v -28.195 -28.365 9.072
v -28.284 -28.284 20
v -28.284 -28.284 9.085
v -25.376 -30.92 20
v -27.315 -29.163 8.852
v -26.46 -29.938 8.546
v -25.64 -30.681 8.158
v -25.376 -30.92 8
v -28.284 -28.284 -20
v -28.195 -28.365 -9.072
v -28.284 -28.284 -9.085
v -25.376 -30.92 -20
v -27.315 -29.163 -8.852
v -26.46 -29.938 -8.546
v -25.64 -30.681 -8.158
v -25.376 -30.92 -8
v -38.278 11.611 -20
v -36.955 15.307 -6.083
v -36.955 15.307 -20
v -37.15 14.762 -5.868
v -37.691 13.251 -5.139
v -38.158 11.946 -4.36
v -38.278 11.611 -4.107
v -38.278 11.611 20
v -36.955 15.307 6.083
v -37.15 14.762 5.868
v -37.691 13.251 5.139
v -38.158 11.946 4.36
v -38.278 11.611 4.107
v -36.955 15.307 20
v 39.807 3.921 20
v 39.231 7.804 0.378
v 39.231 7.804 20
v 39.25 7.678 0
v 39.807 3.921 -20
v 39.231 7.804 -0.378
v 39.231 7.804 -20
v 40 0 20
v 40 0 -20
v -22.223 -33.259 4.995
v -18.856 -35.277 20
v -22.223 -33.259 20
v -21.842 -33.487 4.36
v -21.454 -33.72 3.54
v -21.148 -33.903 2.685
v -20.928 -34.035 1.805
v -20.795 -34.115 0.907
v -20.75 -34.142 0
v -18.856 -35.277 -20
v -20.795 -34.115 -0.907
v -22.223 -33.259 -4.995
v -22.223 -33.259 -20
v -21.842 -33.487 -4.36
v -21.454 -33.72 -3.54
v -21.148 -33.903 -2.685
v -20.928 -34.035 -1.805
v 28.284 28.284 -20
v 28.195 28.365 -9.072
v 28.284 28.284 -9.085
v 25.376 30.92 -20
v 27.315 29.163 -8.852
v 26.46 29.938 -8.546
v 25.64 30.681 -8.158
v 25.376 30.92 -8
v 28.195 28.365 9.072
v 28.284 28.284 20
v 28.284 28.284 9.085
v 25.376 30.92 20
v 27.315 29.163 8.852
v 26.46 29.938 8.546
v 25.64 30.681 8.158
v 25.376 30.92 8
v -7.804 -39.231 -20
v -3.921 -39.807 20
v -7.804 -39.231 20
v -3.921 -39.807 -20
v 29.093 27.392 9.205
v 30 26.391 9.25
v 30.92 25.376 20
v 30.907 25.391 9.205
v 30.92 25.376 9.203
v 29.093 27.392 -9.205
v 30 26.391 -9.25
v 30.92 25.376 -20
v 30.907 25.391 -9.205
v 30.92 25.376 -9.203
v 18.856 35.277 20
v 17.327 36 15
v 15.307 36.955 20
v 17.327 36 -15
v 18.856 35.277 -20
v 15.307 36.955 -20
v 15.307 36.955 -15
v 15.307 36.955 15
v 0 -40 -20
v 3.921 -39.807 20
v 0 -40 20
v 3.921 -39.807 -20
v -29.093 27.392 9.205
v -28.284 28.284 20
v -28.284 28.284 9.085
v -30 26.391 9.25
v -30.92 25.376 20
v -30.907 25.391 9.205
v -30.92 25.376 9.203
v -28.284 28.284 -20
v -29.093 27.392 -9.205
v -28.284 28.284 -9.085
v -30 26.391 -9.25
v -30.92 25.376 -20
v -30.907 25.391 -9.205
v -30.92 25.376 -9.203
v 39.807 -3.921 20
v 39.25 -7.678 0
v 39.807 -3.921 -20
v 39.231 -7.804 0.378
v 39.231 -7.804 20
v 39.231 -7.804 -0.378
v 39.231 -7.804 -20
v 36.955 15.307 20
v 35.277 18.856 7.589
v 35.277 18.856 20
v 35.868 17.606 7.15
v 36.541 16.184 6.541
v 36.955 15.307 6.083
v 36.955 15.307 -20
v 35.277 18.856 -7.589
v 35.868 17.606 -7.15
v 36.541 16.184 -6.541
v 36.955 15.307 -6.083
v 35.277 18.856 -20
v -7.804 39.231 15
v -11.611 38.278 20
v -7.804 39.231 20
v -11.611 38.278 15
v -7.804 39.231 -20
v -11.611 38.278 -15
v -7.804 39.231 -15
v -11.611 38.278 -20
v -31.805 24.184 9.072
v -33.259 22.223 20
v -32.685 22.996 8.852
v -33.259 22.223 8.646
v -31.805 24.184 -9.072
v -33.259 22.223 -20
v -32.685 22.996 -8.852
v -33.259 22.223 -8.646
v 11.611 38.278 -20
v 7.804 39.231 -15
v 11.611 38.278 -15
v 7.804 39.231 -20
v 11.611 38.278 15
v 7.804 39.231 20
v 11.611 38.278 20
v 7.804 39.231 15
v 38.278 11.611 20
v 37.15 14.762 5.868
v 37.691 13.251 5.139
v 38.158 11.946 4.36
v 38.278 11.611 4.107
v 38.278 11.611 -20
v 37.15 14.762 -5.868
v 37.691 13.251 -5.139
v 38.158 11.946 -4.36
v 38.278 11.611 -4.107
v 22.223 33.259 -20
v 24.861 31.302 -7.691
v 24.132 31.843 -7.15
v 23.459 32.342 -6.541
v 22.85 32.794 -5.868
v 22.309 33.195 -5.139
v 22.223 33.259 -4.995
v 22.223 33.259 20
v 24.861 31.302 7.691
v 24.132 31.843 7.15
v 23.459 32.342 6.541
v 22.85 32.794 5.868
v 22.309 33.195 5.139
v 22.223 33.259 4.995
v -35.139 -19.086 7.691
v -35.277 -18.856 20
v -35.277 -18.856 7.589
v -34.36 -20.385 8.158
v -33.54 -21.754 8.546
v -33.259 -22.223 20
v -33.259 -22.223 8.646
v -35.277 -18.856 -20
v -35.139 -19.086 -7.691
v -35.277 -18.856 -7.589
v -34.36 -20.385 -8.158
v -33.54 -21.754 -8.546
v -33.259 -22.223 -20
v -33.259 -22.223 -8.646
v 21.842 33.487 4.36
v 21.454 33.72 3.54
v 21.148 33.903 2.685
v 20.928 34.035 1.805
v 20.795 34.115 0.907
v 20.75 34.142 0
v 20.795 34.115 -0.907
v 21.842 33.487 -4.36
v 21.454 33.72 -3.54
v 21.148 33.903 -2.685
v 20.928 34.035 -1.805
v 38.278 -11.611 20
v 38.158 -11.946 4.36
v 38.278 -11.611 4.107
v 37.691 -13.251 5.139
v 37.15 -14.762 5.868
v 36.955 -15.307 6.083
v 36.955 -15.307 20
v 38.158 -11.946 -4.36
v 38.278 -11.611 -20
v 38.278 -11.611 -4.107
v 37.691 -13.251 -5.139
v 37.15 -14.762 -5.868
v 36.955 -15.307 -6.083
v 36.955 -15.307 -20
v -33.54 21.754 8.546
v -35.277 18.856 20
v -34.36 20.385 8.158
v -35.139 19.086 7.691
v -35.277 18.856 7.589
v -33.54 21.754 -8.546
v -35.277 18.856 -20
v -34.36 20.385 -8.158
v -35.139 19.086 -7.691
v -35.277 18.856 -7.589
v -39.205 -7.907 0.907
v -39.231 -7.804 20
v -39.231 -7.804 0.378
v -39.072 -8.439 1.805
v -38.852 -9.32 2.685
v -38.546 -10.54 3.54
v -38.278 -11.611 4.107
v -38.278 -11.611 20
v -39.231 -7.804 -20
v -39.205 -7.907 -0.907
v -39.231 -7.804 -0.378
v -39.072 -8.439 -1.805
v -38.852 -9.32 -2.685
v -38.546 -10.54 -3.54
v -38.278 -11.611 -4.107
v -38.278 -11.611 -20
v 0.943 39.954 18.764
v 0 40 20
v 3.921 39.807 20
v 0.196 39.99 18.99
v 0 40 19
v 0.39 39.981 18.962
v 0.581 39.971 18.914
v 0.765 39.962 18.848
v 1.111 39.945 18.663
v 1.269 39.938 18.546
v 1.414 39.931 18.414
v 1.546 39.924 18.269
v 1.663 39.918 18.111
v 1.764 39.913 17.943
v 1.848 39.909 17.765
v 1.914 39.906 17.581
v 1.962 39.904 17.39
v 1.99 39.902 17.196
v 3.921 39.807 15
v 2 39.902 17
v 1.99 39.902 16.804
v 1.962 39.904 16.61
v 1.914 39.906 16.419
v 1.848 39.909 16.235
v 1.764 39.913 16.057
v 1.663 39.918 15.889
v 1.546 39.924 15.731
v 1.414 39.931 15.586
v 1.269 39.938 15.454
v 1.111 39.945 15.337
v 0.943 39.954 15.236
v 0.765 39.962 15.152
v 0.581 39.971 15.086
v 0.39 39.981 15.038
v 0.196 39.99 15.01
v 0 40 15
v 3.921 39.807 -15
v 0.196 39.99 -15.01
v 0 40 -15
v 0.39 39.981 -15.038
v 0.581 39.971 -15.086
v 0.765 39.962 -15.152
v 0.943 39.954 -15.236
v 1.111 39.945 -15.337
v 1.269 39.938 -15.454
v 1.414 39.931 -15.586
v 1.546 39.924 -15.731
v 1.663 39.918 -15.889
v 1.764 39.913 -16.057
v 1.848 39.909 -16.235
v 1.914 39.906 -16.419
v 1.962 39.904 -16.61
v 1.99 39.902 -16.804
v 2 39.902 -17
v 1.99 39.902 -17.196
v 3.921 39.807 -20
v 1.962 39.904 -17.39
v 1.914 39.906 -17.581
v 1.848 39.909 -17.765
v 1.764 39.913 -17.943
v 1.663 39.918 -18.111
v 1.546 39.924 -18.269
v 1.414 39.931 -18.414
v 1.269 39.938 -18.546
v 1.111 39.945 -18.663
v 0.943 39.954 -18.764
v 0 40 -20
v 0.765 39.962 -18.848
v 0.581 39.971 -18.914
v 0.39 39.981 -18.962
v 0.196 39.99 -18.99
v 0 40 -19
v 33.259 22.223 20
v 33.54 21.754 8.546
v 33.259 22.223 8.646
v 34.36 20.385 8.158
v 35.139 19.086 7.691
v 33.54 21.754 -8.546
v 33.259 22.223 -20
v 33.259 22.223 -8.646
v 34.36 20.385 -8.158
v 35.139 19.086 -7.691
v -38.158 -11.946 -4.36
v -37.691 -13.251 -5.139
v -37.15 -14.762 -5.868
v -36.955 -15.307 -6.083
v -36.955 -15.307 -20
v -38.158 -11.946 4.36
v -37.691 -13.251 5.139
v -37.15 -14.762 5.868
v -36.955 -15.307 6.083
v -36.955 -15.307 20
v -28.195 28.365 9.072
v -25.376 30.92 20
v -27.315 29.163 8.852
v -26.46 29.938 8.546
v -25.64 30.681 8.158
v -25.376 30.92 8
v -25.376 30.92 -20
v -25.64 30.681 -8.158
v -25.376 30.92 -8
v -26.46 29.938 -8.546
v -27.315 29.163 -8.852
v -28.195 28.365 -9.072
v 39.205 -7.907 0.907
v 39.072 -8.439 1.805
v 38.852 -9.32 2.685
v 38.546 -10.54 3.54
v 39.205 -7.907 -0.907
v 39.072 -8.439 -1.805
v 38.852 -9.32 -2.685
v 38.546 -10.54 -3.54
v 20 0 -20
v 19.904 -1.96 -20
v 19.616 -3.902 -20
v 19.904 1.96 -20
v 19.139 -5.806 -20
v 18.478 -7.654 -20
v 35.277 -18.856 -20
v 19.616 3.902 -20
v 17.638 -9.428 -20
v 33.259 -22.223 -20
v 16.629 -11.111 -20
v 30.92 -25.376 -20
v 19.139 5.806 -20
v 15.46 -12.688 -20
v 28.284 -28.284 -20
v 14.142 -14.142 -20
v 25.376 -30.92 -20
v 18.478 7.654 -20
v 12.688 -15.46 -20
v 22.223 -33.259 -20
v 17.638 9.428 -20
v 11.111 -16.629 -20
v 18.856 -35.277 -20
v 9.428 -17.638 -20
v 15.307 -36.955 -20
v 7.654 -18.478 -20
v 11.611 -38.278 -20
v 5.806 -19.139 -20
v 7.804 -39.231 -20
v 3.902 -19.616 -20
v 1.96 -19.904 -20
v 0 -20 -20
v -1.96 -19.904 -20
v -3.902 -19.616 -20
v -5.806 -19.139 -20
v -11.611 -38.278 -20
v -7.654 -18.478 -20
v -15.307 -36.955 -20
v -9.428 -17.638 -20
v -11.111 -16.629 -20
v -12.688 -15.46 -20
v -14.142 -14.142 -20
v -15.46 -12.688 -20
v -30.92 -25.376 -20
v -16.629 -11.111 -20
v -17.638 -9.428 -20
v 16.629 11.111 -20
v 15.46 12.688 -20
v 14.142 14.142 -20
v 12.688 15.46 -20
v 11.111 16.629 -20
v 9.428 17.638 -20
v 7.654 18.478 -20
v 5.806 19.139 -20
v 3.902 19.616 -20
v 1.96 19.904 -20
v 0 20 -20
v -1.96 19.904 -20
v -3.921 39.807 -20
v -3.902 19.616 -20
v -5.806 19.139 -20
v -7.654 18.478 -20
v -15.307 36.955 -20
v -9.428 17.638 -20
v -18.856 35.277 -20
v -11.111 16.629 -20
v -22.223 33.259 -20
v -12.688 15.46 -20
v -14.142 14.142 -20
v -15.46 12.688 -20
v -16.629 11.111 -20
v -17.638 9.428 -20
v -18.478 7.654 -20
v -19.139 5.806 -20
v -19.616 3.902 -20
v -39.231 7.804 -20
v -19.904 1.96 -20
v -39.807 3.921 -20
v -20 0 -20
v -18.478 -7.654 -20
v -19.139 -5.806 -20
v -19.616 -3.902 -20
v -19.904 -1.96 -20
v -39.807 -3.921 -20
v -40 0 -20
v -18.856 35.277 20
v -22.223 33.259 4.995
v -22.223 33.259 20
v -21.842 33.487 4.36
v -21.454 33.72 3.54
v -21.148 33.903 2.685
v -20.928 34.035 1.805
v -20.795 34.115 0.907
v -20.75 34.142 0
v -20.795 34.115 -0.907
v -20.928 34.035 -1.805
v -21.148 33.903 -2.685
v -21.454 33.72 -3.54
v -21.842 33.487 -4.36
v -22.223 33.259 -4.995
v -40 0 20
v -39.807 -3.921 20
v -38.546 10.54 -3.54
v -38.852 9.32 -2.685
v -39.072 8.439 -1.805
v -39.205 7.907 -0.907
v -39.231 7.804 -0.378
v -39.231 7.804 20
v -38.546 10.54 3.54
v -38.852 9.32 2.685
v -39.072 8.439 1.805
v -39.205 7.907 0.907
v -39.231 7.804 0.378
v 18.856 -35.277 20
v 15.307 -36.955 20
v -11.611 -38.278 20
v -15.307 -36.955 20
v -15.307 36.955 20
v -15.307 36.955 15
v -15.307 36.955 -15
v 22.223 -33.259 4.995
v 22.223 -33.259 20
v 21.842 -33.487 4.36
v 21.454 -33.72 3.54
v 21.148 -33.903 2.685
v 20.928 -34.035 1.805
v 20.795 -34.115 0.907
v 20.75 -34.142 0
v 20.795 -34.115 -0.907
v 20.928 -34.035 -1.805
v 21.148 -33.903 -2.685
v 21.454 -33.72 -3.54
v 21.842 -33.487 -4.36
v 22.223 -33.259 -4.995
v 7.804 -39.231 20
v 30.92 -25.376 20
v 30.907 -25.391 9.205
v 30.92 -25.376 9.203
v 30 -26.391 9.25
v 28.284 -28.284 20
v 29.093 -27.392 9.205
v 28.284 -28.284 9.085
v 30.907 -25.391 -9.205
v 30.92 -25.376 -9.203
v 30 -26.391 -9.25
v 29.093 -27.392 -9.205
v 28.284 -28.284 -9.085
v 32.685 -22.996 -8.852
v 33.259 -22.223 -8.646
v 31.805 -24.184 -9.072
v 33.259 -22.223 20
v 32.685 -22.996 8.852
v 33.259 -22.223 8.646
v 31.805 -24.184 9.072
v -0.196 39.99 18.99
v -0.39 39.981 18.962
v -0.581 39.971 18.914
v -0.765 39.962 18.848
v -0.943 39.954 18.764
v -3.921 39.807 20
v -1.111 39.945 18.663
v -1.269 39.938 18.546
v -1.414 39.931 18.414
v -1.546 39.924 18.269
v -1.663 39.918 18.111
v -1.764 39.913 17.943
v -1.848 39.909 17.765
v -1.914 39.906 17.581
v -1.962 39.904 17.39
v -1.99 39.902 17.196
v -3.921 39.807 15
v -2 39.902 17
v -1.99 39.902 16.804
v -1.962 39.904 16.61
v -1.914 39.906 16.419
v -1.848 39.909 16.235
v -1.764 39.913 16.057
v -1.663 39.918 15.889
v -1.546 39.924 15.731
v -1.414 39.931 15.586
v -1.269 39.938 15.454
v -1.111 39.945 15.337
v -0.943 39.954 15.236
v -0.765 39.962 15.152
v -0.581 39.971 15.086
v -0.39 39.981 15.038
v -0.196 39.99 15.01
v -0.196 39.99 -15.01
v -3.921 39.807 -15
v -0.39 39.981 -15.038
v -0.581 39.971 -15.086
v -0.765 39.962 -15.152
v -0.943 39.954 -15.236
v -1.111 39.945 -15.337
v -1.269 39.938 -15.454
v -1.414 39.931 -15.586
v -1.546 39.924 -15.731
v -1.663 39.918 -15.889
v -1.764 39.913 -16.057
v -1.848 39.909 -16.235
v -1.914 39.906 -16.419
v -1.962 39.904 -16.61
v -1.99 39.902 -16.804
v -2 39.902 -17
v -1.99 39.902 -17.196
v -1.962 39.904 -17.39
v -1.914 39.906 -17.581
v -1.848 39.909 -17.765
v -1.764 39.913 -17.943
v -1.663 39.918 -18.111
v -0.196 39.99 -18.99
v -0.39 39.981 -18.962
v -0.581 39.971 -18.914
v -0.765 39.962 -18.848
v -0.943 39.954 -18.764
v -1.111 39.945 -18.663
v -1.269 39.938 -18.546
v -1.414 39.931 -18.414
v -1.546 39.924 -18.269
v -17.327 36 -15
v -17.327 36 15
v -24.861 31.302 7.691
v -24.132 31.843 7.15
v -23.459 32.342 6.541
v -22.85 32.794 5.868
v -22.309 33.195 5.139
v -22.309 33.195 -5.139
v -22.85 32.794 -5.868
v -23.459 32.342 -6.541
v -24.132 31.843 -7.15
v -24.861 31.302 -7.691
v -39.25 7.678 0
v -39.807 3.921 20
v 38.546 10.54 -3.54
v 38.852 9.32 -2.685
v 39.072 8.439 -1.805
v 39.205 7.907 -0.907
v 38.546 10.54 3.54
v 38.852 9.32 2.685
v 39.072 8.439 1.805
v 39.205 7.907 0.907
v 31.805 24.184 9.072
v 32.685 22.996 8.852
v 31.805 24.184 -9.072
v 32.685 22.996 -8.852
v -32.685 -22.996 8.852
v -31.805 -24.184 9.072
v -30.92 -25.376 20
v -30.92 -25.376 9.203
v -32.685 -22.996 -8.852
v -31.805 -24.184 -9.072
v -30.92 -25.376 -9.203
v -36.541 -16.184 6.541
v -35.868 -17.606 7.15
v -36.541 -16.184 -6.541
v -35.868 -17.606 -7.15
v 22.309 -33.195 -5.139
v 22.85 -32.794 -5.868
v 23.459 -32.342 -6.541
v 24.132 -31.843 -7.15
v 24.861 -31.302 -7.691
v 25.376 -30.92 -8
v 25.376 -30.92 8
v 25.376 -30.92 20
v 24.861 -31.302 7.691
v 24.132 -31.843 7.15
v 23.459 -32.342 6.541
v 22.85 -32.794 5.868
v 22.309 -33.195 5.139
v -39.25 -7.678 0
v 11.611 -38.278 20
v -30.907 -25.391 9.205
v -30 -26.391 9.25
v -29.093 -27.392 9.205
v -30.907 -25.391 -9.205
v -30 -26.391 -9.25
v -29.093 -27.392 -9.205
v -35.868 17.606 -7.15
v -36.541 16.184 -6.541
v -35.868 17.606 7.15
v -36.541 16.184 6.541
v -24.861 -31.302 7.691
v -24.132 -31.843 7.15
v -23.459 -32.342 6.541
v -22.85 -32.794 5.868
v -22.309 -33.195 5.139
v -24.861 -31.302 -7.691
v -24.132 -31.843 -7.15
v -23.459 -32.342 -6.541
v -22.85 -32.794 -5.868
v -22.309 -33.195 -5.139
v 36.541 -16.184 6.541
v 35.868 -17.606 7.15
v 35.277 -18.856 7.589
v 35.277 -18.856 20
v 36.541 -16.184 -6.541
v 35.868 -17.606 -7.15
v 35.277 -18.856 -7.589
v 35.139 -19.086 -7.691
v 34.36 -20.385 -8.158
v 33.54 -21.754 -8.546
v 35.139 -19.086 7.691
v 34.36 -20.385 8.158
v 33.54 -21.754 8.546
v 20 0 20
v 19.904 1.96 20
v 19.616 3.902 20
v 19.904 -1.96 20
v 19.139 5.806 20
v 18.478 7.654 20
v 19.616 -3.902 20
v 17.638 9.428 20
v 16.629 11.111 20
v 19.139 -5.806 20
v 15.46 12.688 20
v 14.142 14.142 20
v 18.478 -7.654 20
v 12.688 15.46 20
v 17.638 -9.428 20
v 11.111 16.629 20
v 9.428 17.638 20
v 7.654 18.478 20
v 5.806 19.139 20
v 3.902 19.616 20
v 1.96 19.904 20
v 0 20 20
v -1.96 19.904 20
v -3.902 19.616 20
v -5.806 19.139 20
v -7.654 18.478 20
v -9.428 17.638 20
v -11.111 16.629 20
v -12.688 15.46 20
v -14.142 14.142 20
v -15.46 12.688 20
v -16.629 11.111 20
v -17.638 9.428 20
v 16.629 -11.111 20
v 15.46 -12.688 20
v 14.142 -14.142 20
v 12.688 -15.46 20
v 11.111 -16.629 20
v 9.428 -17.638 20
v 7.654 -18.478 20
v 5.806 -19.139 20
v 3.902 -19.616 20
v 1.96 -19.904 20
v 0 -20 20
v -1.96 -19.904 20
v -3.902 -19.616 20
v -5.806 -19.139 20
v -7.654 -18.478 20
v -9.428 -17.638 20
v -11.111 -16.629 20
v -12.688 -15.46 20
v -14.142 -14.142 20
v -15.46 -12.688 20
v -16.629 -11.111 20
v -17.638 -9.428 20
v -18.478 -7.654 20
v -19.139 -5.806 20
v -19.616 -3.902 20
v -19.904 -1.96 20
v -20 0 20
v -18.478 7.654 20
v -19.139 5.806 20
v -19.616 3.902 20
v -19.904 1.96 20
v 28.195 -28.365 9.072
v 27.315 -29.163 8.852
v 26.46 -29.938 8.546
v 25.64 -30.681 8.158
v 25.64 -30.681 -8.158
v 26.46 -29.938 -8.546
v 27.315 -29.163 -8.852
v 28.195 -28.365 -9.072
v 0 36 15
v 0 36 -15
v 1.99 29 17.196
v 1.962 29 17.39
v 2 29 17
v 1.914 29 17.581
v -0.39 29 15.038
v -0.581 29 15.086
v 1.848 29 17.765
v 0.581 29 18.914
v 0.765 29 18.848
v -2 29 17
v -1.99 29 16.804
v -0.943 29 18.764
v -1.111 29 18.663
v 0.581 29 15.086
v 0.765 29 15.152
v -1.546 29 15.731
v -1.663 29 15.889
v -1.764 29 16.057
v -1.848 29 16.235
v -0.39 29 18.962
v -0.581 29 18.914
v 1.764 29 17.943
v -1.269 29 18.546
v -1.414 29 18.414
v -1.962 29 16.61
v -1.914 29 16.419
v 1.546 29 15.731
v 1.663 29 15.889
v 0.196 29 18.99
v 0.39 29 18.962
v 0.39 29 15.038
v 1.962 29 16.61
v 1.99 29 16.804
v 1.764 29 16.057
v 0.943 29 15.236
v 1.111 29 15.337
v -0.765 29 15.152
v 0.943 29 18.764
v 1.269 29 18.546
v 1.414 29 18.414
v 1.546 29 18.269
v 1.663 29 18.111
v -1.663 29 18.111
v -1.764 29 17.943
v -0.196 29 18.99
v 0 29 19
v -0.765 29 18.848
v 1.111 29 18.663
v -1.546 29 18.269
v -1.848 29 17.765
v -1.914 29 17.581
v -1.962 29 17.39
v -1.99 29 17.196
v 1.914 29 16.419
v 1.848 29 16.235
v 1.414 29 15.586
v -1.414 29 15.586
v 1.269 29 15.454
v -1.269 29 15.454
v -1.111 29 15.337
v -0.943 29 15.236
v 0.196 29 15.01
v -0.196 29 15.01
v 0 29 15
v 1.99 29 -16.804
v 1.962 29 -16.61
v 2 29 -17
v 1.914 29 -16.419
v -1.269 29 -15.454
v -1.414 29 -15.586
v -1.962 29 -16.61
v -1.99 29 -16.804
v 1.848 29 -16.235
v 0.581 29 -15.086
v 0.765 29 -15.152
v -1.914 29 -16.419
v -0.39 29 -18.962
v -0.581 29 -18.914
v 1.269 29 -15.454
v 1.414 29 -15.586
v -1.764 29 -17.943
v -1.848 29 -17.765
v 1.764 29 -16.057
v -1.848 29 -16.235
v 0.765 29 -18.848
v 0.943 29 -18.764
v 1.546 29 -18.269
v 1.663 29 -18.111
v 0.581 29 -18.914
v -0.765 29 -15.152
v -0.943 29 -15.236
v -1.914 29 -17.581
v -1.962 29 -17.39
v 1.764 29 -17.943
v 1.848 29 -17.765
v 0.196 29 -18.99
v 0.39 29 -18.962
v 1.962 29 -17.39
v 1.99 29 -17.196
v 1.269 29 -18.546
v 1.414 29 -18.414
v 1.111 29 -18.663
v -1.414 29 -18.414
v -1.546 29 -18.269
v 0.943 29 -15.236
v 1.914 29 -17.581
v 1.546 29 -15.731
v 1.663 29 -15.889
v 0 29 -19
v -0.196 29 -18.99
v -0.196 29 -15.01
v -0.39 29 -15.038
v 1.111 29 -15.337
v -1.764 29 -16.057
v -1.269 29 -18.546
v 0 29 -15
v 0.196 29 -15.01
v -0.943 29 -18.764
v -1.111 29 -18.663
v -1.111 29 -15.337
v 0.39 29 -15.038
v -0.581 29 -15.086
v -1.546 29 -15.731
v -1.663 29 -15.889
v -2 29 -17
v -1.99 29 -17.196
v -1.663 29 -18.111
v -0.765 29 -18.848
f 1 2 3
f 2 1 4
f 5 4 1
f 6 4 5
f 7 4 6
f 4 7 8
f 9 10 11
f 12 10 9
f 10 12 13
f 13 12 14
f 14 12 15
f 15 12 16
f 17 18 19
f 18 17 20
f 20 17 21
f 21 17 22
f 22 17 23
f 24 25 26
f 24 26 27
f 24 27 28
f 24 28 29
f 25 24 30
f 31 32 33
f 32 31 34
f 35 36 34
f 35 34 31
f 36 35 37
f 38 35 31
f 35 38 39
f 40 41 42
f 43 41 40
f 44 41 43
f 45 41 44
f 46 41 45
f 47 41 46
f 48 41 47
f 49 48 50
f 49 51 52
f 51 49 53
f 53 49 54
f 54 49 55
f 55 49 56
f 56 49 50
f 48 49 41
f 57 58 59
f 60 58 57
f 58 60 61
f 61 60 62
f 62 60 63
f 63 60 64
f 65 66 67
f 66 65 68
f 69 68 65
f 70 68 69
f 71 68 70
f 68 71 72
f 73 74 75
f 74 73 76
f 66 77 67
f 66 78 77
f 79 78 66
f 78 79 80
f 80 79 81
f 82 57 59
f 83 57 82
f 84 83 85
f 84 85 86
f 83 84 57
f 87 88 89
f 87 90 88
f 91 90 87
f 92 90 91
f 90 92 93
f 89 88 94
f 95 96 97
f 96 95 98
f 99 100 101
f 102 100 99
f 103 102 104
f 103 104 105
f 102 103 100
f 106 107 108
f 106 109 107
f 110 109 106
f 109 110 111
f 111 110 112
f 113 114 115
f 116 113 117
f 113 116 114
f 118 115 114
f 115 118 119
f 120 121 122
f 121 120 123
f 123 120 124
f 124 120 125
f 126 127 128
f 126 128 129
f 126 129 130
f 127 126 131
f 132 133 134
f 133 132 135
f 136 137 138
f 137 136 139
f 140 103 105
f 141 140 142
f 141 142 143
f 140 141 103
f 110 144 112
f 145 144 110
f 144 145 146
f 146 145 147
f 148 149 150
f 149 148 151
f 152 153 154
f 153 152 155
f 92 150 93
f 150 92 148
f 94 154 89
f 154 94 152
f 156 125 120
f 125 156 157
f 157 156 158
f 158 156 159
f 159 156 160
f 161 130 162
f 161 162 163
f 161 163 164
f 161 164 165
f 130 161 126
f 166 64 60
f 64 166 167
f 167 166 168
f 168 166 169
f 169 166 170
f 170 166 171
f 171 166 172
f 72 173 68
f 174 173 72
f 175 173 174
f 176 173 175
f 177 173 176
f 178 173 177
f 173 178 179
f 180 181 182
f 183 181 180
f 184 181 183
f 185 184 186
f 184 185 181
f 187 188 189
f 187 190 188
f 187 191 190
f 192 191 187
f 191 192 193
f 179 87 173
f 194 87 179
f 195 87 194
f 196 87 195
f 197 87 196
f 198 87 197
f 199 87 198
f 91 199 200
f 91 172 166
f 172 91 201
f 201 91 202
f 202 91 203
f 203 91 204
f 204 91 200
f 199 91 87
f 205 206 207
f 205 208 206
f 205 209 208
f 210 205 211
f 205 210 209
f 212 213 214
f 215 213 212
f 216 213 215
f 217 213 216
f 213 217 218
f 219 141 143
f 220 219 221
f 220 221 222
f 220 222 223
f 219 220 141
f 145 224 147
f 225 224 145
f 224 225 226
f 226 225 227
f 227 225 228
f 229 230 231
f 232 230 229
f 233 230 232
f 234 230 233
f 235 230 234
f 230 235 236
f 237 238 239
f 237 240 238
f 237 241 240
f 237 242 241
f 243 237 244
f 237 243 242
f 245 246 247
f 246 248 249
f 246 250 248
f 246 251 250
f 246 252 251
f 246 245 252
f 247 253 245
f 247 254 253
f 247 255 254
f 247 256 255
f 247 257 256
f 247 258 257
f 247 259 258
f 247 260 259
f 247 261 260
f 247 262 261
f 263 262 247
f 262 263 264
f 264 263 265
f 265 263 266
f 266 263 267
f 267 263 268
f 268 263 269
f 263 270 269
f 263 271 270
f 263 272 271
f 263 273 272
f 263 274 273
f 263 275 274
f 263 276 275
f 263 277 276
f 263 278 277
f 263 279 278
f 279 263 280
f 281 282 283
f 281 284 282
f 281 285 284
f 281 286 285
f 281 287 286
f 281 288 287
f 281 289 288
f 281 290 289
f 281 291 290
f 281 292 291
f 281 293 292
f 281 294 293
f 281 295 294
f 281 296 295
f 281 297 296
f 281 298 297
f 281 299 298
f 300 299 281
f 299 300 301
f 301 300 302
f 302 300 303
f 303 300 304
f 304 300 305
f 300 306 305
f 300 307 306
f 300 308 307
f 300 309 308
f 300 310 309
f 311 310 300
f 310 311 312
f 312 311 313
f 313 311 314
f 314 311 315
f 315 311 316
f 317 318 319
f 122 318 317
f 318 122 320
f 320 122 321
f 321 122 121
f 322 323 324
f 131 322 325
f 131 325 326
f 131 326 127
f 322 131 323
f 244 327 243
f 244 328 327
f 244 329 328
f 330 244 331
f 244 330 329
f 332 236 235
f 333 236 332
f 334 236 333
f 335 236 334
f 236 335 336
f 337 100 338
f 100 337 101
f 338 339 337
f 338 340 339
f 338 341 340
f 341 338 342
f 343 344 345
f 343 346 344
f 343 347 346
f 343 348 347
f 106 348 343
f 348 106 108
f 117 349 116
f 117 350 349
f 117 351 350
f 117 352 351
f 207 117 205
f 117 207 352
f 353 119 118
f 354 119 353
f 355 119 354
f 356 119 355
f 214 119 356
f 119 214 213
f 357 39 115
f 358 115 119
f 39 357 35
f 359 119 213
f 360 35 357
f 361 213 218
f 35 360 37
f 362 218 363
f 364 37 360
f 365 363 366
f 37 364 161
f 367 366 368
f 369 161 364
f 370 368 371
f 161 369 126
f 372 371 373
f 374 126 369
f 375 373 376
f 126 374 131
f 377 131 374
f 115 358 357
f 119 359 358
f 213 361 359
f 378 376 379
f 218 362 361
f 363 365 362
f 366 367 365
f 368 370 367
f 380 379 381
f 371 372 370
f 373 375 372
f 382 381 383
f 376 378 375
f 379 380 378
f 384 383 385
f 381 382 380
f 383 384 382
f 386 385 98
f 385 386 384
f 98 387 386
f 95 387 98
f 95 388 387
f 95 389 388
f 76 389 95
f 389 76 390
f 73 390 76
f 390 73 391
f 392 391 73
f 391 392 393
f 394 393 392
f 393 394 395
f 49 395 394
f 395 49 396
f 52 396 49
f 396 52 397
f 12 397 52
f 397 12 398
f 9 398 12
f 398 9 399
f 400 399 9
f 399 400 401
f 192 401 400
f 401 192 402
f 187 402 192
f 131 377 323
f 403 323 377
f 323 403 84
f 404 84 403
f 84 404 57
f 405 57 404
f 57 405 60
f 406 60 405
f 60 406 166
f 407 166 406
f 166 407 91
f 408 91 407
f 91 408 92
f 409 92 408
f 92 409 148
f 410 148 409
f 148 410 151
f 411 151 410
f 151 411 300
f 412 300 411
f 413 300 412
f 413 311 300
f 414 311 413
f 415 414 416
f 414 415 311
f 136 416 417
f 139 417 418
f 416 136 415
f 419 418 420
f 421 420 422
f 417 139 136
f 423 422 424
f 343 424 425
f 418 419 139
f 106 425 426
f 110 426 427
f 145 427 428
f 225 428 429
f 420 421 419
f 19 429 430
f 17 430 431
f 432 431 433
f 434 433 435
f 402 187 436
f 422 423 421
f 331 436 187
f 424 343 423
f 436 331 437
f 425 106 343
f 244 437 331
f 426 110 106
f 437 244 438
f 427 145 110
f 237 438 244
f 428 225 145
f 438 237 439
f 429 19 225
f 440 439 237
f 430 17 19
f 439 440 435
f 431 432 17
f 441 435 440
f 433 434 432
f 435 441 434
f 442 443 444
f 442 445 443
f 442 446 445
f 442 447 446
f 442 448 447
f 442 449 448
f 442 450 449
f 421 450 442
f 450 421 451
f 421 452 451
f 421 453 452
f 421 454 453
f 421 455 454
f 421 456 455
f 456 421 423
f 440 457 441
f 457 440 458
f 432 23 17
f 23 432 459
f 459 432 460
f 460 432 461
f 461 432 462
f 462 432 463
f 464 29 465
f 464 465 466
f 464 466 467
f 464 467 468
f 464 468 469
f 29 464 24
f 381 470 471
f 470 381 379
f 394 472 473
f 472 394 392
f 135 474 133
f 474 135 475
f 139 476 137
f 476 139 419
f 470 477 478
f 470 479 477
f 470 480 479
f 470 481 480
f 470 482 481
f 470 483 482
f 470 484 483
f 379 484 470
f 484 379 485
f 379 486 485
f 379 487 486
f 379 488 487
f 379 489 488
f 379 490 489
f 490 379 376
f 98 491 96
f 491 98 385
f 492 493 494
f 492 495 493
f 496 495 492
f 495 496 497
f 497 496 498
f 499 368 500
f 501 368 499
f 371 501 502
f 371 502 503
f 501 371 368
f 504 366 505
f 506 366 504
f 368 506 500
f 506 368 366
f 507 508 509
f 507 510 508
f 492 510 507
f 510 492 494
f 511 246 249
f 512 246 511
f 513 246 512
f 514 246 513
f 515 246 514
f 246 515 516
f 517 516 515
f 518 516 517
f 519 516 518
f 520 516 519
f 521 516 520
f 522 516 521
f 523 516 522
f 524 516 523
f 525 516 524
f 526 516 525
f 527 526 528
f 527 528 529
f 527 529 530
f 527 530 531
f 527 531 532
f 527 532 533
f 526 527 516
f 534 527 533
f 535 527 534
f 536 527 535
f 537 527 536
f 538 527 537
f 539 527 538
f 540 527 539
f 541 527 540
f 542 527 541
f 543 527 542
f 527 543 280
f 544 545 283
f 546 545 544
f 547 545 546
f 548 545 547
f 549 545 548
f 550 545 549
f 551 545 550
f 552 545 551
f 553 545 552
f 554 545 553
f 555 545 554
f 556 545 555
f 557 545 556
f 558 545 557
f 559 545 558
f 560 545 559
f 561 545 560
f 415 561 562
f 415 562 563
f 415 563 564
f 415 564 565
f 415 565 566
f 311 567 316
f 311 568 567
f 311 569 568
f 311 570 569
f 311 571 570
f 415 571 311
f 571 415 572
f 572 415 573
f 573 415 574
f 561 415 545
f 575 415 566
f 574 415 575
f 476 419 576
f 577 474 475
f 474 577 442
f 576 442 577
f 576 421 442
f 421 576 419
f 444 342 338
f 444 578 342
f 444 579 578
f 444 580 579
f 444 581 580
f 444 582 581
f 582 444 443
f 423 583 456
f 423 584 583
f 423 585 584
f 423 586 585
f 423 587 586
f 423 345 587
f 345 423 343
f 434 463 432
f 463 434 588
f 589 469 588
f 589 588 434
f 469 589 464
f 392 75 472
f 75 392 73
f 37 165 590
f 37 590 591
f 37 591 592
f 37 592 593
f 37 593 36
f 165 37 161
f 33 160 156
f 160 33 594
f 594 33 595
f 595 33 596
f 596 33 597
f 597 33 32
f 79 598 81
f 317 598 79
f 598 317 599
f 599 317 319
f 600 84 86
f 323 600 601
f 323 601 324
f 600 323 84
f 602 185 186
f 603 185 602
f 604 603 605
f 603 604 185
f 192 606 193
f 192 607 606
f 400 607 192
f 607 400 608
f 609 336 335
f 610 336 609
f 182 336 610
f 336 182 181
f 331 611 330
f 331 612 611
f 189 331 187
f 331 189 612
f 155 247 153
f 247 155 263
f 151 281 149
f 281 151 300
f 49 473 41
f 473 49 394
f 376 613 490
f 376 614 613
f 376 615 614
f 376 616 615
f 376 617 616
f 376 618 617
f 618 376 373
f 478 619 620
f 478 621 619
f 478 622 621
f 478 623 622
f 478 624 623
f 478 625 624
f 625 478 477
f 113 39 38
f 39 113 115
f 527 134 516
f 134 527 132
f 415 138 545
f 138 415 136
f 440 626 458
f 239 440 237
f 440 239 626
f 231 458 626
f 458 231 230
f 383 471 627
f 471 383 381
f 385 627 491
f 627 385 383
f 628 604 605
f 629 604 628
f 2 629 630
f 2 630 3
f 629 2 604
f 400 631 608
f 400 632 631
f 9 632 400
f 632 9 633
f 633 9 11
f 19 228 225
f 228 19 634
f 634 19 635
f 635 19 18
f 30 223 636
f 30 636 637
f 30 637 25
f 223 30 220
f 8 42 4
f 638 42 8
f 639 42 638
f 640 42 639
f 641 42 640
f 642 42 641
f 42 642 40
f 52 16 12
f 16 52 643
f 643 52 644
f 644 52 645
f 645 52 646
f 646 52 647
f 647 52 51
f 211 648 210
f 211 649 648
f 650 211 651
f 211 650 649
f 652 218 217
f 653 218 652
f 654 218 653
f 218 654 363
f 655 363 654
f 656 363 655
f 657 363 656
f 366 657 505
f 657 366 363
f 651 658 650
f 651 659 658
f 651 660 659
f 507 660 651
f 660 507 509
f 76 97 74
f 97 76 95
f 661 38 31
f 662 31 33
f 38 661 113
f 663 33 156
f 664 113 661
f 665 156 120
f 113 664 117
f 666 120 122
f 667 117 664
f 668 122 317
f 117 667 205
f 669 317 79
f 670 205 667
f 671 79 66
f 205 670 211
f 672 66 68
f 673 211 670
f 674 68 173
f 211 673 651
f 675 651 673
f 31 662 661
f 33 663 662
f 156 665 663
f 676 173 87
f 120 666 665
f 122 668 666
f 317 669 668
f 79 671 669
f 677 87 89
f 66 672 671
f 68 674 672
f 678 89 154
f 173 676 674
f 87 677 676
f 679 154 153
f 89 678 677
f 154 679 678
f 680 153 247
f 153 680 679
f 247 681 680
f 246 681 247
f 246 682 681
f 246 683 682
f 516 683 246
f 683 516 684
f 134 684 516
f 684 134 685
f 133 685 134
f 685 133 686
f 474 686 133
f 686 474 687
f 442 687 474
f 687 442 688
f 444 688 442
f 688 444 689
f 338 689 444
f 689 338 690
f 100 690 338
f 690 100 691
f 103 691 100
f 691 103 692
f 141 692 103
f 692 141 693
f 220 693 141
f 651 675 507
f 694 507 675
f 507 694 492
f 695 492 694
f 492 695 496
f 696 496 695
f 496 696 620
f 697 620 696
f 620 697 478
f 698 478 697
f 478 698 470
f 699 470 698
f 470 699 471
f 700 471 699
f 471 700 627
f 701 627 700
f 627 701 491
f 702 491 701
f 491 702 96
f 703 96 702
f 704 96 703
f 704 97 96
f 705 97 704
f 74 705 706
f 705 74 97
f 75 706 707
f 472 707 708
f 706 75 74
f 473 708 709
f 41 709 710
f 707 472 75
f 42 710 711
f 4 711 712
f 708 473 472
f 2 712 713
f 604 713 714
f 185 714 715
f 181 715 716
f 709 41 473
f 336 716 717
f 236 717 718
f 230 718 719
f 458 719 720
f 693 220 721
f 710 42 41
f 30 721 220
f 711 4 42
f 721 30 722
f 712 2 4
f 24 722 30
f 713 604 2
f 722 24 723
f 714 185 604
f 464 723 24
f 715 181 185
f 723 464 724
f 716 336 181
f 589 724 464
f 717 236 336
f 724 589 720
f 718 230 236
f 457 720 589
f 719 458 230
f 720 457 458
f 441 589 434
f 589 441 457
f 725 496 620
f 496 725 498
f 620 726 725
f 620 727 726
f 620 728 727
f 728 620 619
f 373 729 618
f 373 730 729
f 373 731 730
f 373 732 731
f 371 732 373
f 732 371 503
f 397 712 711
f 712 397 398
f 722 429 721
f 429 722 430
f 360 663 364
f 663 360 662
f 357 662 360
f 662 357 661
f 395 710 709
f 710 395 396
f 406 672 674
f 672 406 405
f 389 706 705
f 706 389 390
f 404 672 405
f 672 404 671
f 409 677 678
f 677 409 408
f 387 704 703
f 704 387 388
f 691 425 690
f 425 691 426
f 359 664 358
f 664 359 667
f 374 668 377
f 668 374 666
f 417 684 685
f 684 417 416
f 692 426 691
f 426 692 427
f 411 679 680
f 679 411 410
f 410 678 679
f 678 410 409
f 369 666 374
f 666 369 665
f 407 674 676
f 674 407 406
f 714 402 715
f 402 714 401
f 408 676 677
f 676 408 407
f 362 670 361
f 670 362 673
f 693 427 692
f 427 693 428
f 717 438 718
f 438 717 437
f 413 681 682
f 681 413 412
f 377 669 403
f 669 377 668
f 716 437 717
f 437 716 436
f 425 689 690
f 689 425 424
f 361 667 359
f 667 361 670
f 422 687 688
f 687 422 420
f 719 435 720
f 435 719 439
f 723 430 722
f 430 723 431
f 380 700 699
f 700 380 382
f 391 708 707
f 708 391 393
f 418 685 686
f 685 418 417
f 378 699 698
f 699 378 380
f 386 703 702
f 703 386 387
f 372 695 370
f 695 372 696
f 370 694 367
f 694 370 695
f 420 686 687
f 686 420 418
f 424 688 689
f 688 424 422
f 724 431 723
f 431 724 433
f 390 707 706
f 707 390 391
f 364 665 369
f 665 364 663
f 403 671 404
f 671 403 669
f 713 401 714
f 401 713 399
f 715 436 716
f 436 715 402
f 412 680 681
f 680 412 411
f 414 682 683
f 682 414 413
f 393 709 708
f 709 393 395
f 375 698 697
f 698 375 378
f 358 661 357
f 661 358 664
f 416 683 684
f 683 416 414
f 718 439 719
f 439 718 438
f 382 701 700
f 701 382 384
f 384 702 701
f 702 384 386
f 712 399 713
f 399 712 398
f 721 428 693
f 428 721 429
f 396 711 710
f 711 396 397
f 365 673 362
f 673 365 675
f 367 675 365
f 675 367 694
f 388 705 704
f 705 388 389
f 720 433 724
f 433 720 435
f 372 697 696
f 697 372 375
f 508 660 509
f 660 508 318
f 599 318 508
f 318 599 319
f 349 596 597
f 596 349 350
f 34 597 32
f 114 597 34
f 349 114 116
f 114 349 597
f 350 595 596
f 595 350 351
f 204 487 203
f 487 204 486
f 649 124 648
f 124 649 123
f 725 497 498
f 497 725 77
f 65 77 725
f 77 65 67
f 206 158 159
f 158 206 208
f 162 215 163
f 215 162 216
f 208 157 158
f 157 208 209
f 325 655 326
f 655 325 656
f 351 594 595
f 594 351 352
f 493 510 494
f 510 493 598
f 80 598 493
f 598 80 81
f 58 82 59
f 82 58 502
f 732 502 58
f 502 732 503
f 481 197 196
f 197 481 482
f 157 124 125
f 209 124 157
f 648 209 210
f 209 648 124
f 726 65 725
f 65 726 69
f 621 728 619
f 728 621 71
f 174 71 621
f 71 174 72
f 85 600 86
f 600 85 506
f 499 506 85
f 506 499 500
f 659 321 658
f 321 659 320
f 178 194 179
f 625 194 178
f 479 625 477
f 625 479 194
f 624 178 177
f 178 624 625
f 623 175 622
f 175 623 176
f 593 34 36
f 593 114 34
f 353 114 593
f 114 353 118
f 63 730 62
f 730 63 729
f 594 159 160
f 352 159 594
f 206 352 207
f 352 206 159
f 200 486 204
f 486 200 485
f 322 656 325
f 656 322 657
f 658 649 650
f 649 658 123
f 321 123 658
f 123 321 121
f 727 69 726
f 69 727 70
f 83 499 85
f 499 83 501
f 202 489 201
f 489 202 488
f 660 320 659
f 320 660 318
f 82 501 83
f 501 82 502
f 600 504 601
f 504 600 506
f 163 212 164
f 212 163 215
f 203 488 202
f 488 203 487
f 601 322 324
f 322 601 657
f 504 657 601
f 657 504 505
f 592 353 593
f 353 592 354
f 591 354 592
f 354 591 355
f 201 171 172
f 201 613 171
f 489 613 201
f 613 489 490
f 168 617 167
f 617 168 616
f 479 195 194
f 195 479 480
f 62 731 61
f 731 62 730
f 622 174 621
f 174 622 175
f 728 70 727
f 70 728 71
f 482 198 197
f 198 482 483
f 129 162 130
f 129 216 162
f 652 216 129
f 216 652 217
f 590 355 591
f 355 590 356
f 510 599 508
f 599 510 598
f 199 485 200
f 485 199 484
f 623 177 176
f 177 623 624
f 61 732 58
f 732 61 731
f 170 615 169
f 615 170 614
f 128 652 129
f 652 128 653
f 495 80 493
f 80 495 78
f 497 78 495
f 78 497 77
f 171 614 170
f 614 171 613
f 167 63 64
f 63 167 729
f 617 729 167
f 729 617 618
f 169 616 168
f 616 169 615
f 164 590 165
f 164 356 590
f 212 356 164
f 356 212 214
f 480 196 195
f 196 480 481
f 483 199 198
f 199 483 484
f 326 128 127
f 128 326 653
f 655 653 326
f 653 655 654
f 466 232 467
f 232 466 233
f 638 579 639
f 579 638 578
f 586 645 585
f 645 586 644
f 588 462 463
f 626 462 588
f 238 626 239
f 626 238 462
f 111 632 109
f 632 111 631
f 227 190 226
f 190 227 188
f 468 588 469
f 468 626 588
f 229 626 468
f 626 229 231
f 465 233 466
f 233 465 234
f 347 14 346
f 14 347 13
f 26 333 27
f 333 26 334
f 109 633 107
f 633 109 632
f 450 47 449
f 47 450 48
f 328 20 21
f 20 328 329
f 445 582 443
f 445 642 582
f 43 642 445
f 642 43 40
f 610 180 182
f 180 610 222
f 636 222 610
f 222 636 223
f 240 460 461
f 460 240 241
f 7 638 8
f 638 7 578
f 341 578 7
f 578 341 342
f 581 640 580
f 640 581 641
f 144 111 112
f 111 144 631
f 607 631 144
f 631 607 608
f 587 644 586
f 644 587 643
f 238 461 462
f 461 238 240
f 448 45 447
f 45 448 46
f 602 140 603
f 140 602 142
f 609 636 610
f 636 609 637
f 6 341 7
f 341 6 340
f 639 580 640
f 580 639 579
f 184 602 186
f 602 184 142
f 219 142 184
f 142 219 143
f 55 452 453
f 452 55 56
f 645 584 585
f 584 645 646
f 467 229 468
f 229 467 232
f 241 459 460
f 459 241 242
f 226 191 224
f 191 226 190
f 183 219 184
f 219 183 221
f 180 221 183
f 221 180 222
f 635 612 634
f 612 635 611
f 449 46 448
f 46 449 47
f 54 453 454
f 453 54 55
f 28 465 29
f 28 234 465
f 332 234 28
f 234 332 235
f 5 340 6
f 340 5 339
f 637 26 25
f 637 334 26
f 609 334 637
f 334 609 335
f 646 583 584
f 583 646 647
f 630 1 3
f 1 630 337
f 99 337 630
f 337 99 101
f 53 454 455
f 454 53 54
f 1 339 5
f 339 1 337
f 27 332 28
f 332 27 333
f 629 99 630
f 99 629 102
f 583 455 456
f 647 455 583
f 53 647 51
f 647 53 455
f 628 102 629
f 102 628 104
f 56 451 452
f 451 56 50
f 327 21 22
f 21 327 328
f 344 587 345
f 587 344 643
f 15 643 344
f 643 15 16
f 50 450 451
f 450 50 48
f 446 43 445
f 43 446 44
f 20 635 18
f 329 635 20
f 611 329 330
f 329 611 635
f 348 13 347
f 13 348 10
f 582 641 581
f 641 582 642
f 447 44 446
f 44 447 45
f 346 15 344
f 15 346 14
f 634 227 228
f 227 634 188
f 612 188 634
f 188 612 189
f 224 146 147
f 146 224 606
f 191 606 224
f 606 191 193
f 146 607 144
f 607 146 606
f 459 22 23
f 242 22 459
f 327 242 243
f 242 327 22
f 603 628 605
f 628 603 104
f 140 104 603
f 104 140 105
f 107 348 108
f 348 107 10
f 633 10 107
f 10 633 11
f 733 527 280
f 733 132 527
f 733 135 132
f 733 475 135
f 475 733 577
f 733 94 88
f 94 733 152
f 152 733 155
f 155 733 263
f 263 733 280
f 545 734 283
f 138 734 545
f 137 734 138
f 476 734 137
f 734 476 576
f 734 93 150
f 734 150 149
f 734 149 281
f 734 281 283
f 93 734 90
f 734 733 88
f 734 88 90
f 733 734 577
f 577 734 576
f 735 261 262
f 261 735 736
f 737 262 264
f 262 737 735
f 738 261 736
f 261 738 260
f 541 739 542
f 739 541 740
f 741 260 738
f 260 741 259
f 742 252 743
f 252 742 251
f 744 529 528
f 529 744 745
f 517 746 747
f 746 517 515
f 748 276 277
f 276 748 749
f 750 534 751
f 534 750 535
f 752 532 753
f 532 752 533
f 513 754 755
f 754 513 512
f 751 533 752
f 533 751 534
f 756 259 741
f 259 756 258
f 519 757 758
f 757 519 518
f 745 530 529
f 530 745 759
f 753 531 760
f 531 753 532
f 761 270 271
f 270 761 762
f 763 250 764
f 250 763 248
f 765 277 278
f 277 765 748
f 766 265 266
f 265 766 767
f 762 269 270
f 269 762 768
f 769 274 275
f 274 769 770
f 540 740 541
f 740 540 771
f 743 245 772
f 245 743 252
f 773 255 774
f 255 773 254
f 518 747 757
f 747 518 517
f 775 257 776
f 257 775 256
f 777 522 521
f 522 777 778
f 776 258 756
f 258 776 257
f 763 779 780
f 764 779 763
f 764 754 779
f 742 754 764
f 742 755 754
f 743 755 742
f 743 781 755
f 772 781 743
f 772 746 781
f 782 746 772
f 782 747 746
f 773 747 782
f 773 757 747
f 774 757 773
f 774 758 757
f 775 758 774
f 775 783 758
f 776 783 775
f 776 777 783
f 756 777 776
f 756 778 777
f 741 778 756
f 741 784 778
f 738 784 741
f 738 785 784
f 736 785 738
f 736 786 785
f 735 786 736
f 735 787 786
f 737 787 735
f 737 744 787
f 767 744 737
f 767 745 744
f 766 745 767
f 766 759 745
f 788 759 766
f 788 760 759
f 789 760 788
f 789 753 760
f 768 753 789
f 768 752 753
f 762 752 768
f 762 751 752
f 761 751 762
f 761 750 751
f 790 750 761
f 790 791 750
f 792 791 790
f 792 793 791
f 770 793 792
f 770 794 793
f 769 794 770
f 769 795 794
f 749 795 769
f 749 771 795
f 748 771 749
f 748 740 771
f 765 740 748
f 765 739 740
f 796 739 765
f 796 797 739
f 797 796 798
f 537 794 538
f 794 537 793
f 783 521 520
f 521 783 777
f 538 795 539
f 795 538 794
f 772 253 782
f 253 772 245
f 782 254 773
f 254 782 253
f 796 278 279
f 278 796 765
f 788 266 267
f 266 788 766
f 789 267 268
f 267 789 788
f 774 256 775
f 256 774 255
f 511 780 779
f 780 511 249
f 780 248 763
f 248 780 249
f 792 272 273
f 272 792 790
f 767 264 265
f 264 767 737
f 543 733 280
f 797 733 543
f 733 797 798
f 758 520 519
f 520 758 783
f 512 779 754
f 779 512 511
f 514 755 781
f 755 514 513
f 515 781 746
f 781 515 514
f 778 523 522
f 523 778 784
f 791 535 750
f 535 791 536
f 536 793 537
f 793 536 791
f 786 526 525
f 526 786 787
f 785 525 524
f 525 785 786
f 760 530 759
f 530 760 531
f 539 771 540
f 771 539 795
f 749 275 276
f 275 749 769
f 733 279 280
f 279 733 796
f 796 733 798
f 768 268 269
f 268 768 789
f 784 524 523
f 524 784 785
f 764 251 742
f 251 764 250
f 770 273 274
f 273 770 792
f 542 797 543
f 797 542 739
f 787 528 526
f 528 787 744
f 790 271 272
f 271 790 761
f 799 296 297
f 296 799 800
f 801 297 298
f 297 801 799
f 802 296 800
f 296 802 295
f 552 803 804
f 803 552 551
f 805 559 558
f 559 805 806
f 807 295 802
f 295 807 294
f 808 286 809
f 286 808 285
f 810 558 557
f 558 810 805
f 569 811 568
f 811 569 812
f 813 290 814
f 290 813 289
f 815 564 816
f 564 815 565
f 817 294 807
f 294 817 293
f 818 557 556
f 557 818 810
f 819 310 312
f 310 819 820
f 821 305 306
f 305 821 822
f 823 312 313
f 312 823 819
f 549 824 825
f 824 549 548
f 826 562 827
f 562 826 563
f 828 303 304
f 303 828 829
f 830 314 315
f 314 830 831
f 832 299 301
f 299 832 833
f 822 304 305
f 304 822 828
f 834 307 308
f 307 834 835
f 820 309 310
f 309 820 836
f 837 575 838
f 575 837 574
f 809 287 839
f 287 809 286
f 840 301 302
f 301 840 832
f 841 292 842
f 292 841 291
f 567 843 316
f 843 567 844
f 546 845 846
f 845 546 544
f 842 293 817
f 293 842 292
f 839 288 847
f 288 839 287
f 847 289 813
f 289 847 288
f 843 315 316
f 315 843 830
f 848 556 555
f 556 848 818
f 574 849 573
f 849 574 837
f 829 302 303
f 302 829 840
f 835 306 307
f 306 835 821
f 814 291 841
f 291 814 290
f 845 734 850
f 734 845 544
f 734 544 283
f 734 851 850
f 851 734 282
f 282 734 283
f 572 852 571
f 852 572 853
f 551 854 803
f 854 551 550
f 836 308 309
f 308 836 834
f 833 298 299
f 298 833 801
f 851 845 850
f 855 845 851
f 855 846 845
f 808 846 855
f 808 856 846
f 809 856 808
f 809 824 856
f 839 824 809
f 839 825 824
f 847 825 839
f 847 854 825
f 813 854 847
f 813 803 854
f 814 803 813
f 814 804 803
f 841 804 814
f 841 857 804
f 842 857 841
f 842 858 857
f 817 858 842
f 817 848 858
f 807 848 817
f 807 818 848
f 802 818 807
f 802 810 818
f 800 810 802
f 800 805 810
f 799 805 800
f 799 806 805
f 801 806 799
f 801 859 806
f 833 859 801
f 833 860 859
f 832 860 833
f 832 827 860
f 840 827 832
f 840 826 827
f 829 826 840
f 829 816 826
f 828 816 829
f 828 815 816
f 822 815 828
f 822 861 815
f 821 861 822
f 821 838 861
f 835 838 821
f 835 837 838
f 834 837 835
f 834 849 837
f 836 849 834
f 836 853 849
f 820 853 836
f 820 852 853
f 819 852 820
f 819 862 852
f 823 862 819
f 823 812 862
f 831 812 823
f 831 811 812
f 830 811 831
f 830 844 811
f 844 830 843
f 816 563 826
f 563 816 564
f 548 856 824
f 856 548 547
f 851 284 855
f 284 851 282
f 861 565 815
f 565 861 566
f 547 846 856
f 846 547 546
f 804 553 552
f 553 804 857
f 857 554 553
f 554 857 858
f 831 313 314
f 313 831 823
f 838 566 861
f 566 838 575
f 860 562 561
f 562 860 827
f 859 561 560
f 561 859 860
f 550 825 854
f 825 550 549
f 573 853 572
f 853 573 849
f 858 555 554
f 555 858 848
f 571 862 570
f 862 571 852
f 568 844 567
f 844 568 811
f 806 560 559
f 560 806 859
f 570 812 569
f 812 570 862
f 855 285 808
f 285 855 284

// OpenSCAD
// COBRA Vertebra - T10 V16
// Height: 40.0mm, OD: 80.0mm

$fn = 64;

difference() {
    // Outer cylinder
    cylinder(h=40.0, d=80.0, center=true);
    
    // Inner channel
    cylinder(h=42.0, d=40.0, center=true);

    // Battery cavity 1
    rotate([0, 0, 0])
    translate([30.0, 0, 0])
    rotate([90, 0, 0])
    cylinder(h=74.0, d=18.5, center=true);

    // Battery cavity 2
    rotate([0, 0, 180])
    translate([30.0, 0, 0])
    rotate([90, 0, 0])
    cylinder(h=74.0, d=18.5, center=true);

    // Solar panel cavity
    translate([0, 38.0, 0])
    cube([50, 4, 30], center=true);

    // Pivot holes
    translate([0, 40.0, 17.0])
    rotate([90, 0, 0])
    cylinder(h=22.0, d=4, center=true);
    
    translate([0, 40.0, -17.0])
    rotate([90, 0, 0])
    cylinder(h=22.0, d=4, center=true);
}
